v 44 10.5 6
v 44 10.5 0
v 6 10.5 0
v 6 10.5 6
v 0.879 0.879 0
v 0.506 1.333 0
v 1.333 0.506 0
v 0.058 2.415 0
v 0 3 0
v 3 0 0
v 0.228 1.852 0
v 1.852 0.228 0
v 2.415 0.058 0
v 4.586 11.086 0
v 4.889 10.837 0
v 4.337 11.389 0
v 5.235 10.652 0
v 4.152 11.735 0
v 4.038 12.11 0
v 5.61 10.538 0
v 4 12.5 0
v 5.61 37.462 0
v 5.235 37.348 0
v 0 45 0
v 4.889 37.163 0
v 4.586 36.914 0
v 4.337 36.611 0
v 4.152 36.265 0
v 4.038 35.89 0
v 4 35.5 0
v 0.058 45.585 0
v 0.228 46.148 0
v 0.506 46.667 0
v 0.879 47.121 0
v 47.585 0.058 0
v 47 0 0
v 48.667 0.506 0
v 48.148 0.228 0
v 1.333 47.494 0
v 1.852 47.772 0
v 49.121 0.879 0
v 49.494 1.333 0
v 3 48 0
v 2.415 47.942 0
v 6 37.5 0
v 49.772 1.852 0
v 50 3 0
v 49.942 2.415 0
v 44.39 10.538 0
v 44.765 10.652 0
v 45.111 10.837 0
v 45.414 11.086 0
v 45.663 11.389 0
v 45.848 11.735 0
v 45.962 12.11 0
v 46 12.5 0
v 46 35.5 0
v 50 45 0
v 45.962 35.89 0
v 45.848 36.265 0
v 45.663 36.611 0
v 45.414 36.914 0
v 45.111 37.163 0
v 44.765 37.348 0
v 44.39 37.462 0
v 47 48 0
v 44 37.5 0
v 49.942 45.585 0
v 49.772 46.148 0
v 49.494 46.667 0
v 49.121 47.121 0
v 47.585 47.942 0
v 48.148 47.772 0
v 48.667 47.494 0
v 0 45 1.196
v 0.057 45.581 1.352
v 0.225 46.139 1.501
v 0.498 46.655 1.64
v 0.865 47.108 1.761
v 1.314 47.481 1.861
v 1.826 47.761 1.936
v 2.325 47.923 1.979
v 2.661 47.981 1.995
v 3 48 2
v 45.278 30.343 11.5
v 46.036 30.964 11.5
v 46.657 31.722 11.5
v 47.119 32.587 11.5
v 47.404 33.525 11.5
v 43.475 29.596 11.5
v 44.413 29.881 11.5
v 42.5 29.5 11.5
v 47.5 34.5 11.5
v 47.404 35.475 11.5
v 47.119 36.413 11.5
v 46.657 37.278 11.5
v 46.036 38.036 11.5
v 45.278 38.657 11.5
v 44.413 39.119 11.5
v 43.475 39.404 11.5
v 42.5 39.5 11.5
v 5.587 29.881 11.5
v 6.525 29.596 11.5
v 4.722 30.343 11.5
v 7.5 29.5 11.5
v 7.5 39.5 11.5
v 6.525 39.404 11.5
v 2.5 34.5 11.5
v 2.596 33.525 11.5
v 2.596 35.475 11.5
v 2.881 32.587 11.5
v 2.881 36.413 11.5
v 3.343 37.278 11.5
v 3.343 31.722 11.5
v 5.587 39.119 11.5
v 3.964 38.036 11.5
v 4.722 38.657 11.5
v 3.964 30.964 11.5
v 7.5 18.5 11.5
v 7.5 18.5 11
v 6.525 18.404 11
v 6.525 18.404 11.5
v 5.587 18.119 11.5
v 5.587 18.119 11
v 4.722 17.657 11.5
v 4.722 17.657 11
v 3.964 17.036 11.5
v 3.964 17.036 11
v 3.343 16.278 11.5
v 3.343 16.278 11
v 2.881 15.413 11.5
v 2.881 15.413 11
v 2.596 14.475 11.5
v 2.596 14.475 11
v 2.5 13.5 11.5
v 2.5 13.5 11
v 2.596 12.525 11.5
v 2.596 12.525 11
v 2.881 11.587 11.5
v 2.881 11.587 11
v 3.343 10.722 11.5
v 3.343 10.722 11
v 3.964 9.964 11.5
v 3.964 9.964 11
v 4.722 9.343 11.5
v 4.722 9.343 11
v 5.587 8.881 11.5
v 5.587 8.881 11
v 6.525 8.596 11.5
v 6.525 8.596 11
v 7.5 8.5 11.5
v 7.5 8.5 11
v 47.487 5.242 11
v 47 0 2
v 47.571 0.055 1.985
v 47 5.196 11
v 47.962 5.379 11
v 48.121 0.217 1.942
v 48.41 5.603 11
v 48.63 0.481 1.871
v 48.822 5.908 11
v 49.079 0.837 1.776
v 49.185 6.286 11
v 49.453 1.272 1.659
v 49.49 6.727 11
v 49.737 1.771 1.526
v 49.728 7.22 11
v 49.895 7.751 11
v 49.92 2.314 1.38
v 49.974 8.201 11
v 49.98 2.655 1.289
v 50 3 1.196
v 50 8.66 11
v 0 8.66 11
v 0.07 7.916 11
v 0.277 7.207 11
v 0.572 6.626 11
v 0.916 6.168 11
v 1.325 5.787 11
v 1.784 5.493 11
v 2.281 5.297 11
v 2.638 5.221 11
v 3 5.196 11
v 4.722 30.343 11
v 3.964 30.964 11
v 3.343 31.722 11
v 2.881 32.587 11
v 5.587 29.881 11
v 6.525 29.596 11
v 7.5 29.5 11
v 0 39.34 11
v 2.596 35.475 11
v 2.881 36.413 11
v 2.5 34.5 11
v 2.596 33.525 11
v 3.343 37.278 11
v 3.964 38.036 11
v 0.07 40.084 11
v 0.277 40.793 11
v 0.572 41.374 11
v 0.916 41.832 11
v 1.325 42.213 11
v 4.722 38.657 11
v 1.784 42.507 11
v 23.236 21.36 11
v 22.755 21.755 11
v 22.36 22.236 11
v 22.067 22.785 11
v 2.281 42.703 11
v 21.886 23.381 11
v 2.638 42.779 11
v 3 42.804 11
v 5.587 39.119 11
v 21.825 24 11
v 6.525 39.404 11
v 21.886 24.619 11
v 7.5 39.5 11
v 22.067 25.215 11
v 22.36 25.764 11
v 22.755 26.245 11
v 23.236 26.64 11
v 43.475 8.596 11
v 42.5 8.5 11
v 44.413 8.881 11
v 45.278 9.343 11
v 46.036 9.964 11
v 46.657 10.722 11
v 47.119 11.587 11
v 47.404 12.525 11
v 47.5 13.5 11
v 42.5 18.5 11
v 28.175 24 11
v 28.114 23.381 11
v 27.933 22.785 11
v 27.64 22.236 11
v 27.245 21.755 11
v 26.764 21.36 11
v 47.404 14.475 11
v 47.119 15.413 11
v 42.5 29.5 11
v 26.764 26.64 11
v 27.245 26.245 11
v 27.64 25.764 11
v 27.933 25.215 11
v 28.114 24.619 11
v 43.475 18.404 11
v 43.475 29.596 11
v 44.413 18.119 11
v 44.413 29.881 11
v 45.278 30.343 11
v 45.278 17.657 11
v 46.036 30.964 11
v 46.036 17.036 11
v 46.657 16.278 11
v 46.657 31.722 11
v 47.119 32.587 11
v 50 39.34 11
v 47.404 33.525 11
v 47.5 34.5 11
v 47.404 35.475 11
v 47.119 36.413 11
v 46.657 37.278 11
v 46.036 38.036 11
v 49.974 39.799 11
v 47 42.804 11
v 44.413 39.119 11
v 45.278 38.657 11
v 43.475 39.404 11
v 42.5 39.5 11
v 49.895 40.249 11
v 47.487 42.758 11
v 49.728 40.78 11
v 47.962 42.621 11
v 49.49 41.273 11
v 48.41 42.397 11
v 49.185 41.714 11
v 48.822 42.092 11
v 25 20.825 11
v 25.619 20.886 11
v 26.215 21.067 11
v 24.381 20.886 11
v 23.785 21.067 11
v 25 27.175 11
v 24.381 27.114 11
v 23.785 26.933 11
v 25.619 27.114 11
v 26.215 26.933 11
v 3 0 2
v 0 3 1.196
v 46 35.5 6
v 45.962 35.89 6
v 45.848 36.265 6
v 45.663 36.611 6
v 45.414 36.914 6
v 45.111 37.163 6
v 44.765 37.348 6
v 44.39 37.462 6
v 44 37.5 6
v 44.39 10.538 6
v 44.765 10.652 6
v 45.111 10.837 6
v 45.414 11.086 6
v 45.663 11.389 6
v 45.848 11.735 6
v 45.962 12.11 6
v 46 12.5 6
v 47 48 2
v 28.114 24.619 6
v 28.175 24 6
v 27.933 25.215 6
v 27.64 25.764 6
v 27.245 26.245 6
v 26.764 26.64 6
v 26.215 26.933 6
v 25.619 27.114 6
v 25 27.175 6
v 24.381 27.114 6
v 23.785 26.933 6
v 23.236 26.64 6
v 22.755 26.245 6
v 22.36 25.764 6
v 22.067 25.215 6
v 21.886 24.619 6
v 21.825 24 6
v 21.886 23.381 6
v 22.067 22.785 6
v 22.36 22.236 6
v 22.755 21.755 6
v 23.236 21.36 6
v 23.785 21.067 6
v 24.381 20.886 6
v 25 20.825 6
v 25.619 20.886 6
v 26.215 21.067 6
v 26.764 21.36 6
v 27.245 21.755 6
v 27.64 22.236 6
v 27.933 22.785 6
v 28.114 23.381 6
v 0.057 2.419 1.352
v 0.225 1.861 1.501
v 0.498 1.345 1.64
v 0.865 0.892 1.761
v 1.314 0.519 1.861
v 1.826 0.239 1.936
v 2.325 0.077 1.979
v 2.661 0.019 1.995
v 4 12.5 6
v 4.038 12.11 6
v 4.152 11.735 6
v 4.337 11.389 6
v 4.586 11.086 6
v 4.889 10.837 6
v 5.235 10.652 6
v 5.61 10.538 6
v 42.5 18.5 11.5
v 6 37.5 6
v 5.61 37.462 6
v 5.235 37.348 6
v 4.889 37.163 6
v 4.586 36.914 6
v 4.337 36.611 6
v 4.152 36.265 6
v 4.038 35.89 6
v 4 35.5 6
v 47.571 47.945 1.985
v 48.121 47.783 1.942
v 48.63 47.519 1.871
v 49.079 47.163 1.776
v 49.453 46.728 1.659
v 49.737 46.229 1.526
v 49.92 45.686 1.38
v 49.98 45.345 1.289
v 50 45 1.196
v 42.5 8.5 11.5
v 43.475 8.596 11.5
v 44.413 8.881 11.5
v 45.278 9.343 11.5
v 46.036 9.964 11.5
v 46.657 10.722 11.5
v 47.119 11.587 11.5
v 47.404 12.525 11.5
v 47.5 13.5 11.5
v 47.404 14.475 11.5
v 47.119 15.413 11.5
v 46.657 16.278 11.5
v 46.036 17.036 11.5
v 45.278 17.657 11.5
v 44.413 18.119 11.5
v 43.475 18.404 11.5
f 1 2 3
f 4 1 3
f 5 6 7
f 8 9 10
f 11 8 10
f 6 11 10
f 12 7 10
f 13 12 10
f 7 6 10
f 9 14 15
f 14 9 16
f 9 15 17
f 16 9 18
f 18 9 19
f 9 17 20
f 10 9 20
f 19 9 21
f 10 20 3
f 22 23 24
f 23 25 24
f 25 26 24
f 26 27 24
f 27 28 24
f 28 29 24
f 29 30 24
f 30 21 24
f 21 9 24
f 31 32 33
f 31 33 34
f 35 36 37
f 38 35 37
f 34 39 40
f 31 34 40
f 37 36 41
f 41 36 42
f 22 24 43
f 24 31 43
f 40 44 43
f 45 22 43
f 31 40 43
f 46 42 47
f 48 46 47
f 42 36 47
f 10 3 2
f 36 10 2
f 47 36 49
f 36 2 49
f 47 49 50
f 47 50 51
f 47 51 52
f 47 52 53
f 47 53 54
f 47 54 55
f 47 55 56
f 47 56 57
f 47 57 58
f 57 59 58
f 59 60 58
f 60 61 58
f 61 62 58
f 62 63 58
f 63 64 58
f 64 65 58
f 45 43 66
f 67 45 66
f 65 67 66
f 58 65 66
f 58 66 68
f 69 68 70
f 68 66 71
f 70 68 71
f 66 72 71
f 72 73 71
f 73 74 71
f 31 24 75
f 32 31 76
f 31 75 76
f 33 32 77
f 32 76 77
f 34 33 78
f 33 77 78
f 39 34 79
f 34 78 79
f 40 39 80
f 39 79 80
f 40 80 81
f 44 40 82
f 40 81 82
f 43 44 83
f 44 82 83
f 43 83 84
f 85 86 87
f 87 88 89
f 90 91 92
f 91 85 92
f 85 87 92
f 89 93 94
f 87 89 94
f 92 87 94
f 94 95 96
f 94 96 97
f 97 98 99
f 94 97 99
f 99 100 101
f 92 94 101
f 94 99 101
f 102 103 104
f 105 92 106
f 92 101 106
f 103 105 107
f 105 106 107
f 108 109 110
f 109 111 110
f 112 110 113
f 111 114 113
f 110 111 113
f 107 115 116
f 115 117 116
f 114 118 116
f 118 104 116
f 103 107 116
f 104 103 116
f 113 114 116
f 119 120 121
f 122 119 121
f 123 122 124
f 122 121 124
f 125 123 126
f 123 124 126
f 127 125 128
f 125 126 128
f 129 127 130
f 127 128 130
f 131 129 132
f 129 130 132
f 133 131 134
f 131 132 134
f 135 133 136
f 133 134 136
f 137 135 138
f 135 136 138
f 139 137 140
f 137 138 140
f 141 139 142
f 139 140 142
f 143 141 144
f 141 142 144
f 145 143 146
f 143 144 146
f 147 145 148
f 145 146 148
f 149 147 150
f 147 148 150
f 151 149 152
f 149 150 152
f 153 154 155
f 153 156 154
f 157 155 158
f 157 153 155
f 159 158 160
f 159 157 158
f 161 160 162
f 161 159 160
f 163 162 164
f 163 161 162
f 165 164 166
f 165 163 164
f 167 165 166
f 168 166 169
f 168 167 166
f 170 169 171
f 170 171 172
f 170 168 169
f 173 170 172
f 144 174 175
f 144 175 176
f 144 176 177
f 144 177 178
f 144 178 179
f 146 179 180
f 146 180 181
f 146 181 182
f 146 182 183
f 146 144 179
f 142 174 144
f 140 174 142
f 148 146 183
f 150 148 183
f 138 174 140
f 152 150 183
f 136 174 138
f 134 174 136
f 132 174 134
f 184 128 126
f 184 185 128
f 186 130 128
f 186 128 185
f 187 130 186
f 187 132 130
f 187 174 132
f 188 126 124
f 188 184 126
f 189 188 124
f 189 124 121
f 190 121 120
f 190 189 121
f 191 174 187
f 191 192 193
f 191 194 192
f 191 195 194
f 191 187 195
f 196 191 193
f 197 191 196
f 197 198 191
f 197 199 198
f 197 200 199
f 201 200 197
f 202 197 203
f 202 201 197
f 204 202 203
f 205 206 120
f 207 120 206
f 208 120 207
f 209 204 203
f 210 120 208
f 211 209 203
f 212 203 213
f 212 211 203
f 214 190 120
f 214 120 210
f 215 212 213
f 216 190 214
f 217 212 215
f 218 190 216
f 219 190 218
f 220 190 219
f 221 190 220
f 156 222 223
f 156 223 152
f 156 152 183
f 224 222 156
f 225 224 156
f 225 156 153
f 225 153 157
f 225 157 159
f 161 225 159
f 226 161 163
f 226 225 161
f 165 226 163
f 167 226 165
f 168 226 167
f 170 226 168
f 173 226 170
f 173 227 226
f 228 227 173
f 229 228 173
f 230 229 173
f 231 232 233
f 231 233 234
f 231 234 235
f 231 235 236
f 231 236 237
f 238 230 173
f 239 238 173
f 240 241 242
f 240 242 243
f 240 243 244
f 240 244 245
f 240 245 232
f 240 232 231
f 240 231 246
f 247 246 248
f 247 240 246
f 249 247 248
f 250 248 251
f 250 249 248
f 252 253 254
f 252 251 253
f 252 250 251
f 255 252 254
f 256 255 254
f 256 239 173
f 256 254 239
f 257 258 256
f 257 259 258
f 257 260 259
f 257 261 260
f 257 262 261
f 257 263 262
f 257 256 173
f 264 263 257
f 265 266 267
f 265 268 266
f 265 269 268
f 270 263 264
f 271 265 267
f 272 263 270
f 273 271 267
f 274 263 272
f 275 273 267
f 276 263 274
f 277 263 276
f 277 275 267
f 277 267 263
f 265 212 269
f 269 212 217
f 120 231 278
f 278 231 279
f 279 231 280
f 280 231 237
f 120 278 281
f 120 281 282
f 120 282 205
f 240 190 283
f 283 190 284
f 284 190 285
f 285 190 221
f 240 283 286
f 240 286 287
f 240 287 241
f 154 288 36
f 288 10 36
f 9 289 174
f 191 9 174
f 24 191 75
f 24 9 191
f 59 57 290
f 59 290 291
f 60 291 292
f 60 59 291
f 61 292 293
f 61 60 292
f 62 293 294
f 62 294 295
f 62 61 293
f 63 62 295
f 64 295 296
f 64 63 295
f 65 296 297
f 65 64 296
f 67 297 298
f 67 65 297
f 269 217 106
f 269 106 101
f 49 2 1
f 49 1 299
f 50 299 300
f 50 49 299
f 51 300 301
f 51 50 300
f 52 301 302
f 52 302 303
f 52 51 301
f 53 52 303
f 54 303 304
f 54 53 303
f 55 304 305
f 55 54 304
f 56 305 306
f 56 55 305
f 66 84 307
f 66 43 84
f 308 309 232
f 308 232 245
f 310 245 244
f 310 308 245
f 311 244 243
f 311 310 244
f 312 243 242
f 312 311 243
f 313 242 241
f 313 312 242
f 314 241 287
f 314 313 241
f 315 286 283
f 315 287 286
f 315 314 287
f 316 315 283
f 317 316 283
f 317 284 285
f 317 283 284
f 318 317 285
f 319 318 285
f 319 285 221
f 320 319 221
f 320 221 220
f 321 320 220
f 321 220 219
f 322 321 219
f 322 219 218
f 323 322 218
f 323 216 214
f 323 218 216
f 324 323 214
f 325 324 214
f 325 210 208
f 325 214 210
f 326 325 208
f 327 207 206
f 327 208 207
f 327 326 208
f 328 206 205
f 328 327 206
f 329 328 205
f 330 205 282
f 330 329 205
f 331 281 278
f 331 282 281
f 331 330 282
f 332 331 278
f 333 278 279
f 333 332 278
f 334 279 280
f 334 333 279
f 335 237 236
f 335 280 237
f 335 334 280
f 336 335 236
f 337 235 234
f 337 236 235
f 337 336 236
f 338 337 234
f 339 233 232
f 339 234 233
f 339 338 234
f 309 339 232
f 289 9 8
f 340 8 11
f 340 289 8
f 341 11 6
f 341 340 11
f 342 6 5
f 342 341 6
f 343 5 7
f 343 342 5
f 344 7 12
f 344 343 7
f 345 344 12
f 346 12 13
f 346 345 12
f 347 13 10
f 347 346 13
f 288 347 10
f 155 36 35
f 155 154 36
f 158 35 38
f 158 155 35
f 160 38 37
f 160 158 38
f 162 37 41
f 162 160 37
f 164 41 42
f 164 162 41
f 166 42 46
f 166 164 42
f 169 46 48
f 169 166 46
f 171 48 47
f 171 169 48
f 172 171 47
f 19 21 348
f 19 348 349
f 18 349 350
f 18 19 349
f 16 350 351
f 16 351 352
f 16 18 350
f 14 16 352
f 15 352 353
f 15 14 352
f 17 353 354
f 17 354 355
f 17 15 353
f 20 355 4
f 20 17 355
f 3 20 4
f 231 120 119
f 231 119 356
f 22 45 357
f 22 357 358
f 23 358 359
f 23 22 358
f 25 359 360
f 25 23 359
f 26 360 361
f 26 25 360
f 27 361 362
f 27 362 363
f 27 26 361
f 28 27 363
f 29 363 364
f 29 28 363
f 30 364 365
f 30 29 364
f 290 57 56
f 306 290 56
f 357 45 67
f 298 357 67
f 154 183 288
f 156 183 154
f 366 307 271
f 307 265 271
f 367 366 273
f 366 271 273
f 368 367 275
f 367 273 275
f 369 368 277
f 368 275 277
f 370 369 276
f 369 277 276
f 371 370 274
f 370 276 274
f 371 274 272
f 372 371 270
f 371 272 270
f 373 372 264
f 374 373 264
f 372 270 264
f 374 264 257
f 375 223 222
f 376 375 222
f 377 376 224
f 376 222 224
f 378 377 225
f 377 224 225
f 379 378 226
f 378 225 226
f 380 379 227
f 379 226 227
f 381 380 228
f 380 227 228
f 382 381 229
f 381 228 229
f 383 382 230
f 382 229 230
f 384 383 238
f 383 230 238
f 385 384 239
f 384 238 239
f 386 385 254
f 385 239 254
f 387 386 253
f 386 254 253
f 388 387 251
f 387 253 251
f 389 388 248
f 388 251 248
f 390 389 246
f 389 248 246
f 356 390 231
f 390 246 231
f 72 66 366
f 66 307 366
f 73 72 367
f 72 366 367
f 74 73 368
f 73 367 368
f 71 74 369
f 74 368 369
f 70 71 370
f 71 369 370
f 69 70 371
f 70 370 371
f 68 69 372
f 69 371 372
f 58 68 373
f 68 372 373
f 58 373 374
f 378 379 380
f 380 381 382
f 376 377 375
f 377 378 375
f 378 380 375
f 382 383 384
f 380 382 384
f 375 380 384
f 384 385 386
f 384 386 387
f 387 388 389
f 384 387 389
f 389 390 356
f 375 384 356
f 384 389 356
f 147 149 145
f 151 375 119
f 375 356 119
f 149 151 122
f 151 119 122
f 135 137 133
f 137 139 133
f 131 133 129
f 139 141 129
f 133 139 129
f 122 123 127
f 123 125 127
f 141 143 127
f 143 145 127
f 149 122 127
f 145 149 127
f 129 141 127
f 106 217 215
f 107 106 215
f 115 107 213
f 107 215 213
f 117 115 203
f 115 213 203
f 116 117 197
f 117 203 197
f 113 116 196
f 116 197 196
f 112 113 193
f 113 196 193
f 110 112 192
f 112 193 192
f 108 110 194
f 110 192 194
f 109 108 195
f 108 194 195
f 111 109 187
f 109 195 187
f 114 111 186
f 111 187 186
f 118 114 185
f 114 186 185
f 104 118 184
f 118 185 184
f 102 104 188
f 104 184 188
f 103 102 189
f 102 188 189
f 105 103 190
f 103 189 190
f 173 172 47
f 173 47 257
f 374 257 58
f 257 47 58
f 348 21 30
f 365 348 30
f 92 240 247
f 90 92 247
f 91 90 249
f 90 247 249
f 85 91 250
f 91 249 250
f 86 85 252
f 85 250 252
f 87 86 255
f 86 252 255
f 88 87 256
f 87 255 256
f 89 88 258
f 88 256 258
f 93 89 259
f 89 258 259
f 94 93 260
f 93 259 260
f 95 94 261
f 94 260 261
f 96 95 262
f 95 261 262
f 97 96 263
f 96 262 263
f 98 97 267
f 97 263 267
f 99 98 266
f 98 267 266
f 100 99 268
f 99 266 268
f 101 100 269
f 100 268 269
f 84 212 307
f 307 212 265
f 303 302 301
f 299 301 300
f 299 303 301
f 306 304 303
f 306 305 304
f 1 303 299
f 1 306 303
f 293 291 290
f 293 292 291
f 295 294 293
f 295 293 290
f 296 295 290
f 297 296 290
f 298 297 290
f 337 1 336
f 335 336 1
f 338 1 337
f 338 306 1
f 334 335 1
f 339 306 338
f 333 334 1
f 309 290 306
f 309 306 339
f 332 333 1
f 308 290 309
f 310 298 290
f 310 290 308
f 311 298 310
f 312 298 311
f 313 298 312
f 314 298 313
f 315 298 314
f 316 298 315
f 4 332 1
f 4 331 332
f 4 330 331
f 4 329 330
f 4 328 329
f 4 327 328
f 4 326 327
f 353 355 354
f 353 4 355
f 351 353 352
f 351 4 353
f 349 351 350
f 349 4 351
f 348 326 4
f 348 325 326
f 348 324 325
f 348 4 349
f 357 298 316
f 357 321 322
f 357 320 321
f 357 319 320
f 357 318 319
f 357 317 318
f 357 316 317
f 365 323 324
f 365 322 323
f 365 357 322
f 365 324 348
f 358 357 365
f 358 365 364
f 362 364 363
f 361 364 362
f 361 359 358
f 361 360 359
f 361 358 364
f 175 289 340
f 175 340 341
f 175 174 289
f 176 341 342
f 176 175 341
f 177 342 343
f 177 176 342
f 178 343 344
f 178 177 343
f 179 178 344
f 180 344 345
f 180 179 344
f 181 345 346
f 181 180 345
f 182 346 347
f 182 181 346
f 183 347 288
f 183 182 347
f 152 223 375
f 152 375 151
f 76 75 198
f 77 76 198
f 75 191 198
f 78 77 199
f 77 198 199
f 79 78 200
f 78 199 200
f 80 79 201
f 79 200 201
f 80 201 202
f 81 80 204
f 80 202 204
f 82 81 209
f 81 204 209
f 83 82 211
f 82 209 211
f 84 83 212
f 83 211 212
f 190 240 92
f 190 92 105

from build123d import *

# Parameters (mm, degrees)
SKETCH_W        = 50
SKETCH_H        = 48
PAD_DEPTH       = 11
CHAMFER_1_ANGLE = 30
CHAMFER_1_SIZE  = 9
CHAMFER_2_ANGLE = 30
CHAMFER_2_SIZE  = 9
FILLET_R        = 3
PAD001_DEPTH    = 0.5
SKETCH002_R     = 3.175
POCKET_DEPTH    = 11.501
POCKET001_DEPTH = 6


with BuildPart() as part:
    # Sketch → Pad (new body)
    with BuildSketch(Plane.XY):
        with Locations((25, 24)):
            Rectangle(SKETCH_W, SKETCH_H)
    extrude(amount=PAD_DEPTH)

    # Chamfer 1
    chamfer_1_edges = [part.edges().sort_by_distance(p)[0] for p in [
        (25, 0, 11),
    ]]
    chamfer_1_side = part.faces().sort_by_distance((25, 0, 5.5))[0]
    chamfer(chamfer_1_edges, length=CHAMFER_1_SIZE, angle=CHAMFER_1_ANGLE, reference=chamfer_1_side)

    # Chamfer 2
    chamfer_2_edges = [part.edges().sort_by_distance(p)[0] for p in [
        (25, 48, 11),
    ]]
    chamfer_2_side = part.faces().sort_by_distance((25, 48, 5.5))[0]
    chamfer(chamfer_2_edges, length=CHAMFER_2_SIZE, angle=CHAMFER_2_ANGLE, reference=chamfer_2_side)

    # Fillet
    fillet_edges = [part.edges().sort_by_distance(p)[0] for p in [
        (50, 2.598076, 6.5),
        (50, 0, 1),
        (50, 45.401924, 6.5),
        (50, 48, 1),
        (0, 45.401924, 6.5),
        (0, 48, 1),
        (0, 2.598076, 6.5),
        (0, 0, 1),
    ]]
    fillet(fillet_edges, radius=FILLET_R)

    # Sketch001 (on DatumPlane) → Pad001 (join)
    with BuildSketch(Plane.XY.offset(11)):
        with BuildLine():
            Line((7.5, 39.5), (42.5, 39.5))
            ThreePointArc((42.5, 29.5), (47.5, 34.5), (42.5, 39.5))
            Line((42.5, 29.5), (7.5, 29.5))
            ThreePointArc((7.5, 39.5), (2.5, 34.5), (7.5, 29.5))
        make_face()
        with BuildLine():
            Line((7.5, 18.5), (42.5, 18.5))
            ThreePointArc((42.5, 8.5), (47.5, 13.5), (42.5, 18.5))
            Line((42.5, 8.5), (7.5, 8.5))
            ThreePointArc((7.5, 18.5), (2.5, 13.5), (7.5, 8.5))
        make_face()
    extrude(amount=PAD001_DEPTH)

    # Sketch002 → Pocket (cut, through all)
    with BuildSketch(Plane.XY):
        with Locations((25, 24)):
            Circle(SKETCH002_R)
    extrude(amount=POCKET_DEPTH, mode=Mode.SUBTRACT)

    # Sketch003 → Pocket001 (cut)
    with BuildSketch(Plane.XY):
        with BuildLine():
            Line((6, 37.5), (44, 37.5))
            ThreePointArc((46, 35.5), (45.414214, 36.914214), (44, 37.5))
            Line((46, 35.5), (46, 12.5))
            ThreePointArc((44, 10.5), (45.414214, 11.085786), (46, 12.5))
            Line((44, 10.5), (6, 10.5))
            ThreePointArc((4, 12.5), (4.585786, 11.085786), (6, 10.5))
            Line((4, 12.5), (4, 35.5))
            ThreePointArc((6, 37.5), (4.585786, 36.914214), (4, 35.5))
        make_face()
    extrude(amount=POCKET001_DEPTH, mode=Mode.SUBTRACT)


solid = part.part
